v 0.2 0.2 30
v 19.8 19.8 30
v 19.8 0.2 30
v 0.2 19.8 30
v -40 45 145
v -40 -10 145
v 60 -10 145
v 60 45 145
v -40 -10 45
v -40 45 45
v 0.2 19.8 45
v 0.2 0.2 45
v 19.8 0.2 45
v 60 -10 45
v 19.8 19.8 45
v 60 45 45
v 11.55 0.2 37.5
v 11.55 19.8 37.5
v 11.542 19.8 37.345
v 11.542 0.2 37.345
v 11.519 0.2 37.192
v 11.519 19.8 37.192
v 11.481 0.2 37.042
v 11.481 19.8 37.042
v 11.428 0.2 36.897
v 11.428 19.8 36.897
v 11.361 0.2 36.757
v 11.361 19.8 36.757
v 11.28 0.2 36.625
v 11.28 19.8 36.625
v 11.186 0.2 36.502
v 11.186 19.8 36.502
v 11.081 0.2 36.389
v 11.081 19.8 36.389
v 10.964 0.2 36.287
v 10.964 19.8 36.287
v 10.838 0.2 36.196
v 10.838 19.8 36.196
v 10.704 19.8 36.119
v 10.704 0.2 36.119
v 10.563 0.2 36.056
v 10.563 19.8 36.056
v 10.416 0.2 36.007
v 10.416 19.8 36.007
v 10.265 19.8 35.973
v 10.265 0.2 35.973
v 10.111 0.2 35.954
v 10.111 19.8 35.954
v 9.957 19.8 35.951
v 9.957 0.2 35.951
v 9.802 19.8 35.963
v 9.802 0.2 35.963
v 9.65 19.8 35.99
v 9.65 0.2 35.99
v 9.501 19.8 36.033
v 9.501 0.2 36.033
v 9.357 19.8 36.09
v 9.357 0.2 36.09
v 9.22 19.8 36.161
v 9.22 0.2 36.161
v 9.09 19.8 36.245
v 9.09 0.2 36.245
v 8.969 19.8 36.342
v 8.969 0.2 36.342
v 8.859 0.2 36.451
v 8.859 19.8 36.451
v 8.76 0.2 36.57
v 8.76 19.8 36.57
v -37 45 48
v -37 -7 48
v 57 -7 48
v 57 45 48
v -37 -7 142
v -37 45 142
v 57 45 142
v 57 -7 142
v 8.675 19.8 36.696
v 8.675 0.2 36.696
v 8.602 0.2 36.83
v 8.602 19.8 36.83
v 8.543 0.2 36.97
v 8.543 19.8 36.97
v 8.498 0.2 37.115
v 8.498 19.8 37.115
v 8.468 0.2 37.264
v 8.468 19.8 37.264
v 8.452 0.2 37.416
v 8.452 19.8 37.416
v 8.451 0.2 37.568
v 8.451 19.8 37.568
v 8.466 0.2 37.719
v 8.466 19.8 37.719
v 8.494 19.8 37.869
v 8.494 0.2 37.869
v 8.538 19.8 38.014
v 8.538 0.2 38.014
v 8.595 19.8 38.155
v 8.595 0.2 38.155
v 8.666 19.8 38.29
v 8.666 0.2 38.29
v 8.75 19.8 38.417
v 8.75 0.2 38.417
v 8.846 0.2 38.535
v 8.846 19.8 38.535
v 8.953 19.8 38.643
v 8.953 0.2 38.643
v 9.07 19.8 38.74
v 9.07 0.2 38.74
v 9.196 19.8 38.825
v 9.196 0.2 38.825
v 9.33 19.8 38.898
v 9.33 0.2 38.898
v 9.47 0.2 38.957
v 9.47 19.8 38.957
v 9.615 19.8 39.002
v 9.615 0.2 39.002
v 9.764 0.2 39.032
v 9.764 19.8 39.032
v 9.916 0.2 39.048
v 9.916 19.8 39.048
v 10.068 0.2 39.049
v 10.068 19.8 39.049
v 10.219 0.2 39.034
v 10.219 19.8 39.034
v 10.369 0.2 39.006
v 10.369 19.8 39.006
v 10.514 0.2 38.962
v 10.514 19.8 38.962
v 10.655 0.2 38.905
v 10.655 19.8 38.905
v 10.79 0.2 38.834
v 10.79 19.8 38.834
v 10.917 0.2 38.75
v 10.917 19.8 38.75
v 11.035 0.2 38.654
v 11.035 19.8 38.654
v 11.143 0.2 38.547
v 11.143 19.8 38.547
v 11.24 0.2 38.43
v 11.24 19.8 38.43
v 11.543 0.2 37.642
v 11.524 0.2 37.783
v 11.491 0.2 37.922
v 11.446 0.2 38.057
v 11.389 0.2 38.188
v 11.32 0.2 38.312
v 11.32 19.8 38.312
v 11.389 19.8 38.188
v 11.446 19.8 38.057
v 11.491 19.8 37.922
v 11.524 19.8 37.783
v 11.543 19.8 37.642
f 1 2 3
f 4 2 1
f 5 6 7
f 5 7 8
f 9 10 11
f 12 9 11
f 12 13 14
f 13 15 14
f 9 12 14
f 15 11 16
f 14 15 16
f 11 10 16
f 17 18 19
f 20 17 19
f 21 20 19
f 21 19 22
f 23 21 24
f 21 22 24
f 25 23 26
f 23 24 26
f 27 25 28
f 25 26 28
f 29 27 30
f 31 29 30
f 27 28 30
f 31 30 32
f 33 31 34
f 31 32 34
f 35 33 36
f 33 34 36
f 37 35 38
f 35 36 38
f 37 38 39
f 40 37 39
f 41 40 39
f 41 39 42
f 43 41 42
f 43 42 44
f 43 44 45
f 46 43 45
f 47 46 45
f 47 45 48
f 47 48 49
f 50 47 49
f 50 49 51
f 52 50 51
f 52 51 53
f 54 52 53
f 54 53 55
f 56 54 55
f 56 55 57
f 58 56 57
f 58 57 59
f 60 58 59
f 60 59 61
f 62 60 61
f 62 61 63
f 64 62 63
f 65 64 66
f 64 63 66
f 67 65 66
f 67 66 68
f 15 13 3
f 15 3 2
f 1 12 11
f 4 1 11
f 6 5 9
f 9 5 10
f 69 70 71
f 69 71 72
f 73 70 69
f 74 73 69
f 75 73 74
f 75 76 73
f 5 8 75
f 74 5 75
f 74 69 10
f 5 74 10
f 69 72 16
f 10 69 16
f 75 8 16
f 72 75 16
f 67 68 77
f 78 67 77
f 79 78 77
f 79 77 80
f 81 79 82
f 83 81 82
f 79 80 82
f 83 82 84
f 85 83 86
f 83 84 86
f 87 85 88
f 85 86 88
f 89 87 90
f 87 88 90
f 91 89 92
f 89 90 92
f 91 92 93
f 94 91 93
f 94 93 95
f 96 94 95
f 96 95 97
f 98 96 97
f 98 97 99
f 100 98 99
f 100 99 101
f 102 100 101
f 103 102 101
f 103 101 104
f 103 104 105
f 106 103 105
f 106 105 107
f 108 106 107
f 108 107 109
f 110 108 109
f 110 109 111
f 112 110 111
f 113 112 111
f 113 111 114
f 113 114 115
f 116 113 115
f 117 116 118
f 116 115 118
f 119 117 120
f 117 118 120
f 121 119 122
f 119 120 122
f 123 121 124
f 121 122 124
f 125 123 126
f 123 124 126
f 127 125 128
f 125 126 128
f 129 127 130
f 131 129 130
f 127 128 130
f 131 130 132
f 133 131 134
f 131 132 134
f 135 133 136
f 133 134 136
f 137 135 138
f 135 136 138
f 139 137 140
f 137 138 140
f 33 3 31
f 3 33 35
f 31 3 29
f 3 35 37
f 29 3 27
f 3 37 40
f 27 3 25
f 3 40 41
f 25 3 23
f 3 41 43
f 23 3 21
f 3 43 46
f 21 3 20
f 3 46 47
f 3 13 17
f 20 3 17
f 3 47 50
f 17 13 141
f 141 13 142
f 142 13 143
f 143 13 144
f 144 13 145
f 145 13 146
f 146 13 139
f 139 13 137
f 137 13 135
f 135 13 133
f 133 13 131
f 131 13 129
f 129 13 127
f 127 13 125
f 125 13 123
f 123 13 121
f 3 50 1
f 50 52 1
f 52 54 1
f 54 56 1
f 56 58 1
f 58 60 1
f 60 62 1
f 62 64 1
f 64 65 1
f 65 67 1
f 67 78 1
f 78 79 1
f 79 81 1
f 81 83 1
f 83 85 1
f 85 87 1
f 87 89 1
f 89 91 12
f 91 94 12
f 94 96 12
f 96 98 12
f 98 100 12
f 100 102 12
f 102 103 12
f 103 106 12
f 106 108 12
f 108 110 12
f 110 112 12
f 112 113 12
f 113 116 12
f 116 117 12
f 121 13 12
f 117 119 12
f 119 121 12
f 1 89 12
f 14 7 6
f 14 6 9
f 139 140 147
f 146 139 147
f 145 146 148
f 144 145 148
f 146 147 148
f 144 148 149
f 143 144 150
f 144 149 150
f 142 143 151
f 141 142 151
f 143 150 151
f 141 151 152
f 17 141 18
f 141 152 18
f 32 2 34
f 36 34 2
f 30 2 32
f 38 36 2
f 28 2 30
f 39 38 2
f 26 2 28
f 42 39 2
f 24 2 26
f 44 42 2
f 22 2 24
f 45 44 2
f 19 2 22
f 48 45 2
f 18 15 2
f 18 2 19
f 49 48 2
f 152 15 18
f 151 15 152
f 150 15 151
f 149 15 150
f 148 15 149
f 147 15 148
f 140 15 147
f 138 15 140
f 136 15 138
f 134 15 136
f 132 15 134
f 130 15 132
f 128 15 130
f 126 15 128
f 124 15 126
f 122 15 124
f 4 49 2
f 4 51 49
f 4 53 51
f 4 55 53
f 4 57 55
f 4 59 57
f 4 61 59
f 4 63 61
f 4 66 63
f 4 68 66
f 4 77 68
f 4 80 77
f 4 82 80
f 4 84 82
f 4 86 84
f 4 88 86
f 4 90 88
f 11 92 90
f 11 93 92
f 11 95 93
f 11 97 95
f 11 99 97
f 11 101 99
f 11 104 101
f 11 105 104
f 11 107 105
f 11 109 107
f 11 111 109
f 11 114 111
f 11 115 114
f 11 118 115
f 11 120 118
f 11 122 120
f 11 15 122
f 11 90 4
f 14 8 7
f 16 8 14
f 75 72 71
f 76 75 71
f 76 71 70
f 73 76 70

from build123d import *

# Parameters (mm, degrees)
SKETCH_1_W           = 20
SKETCH_1_H           = 20
EXTRUDE_1_DEPTH      = 120
SKETCH_2_W           = 10
SKETCH_2_H           = 20
CUT_EXTRUDE_1_DEPTH  = 120
CUT_EXTRUDE_2_DEPTH  = 120
SKETCH_4_R           = 3
CUT_EXTRUDE_3_DEPTH  = 2
SKETCH_8_W           = 19.6
SKETCH_8_H           = 0.2
SKETCH_8_W_2         = 0.2
SKETCH_8_H_2         = 19.6
CUT_EXTRUDE_6_DEPTH  = 15
SKETCH_9_W           = 10
SKETCH_9_H           = 20
CUT_EXTRUDE_7_DEPTH  = 20
SKETCH_10_W          = 19.6
SKETCH_10_H          = 19.6
EXTRUDE_2_DEPTH      = 15
CUT_EXTRUDE_8_DEPTH  = 20
CUT_EXTRUDE_9_DEPTH  = 20
SKETCH_13_W          = 55
SKETCH_13_H          = 20
SKETCH_13_W_2        = 18.82824967
CUT_EXTRUDE_10_DEPTH = 20
SKETCH_14_W          = 100
SKETCH_14_H          = 55
EXTRUDE_5_DEPTH      = 5
SKETCH_17_W          = 2
SKETCH_17_H          = 55
CUT_EXTRUDE_12_DEPTH = 1000
EXTRUDE_6_DEPTH      = 94
SKETCH_19_W          = 3
SKETCH_19_H          = 55
EXTRUDE_7_DEPTH      = 100


with BuildPart() as part:
    # 草图1 → 凸台-拉伸1 (new body)
    with BuildSketch(Plane.XY):
        with Locations((10, 10)):
            Rectangle(SKETCH_1_W, SKETCH_1_H)
    extrude(amount=EXTRUDE_1_DEPTH)

    # 草图2 → 切除-拉伸1 (cut)
    with BuildSketch(Plane(origin=(0, 20, 0), x_dir=(1, 0, 0), z_dir=(0, 1, 0))):
        with Locations((15, -10)):
            Rectangle(SKETCH_2_W, SKETCH_2_H)
    extrude(amount=-CUT_EXTRUDE_1_DEPTH, mode=Mode.SUBTRACT)

    # 草图3 → 切除-拉伸2 (cut)
    with BuildSketch(Plane(origin=(10, 0, 0), x_dir=(0, 0, -1), z_dir=(1, 0, 0))):
        with BuildLine():
            ThreePointArc((-8.45, 10), (-9.40684068, 11.432013275), (-11.096015511, 11.096015511))
            Line((-11.096015511, 11.096015511), (-8.903984489, 8.903984489))
            ThreePointArc((-8.903984489, 8.903984489), (-8.567986725, 9.40684068), (-8.45, 10))
        make_face()
        with BuildLine():
            Line((-8.903984489, 8.903984489), (-11.096015511, 11.096015511))
            ThreePointArc((-11.096015511, 11.096015511), (-11.096015511, 8.903984489), (-8.903984489, 8.903984489))
        make_face()
    extrude(amount=-CUT_EXTRUDE_2_DEPTH, mode=Mode.SUBTRACT)

    # 草图4 → 切除-拉伸3 (cut)
    with BuildSketch(Plane.ZY):
        with Locations((10, 10)):
            Circle(SKETCH_4_R)
    extrude(amount=-CUT_EXTRUDE_3_DEPTH, mode=Mode.SUBTRACT)

    # 草图8 → 切除-拉伸6 (cut)
    with BuildSketch(Plane.XY.offset(120)):
        with Locations((10, 19.9)):
            Rectangle(SKETCH_8_W, SKETCH_8_H)
        with Locations((0.1, 19.9)):
            Rectangle(SKETCH_8_W_2, SKETCH_8_H)
        with Locations((0.1, 10)):
            Rectangle(SKETCH_8_W_2, SKETCH_8_H_2)
        with Locations((19.9, 10)):
            Rectangle(SKETCH_8_W_2, SKETCH_8_H_2)
        with Locations((19.9, 0.1)):
            Rectangle(SKETCH_8_W_2, SKETCH_8_H)
        with Locations((10, 0.1)):
            Rectangle(SKETCH_8_W, SKETCH_8_H)
        with Locations((0.1, 0.1)):
            Rectangle(SKETCH_8_W_2, SKETCH_8_H)
        with Locations((19.9, 19.9)):
            Rectangle(SKETCH_8_W_2, SKETCH_8_H)
    extrude(amount=-CUT_EXTRUDE_6_DEPTH, mode=Mode.SUBTRACT)

    # 草图9 → 切除-拉伸7 (cut)
    with BuildSketch(Plane(origin=(0, 20, 0), x_dir=(1, 0, 0), z_dir=(0, 1, 0))):
        Polygon((0, 0), (0, -45), (20, -45), (20, -20), (10, -20), (10, 0), align=None)
        with Locations((15, -10)):
            Rectangle(SKETCH_9_W, SKETCH_9_H)
    extrude(amount=-CUT_EXTRUDE_7_DEPTH, mode=Mode.SUBTRACT)

    # 草图10 → 凸台-拉伸2 (add)
    with BuildSketch(Plane(origin=(0, 0, 45), x_dir=(-1, 0, 0), z_dir=(0, 0, -1))):
        with Locations((-10, 10)):
            Rectangle(SKETCH_10_W, SKETCH_10_H)
    extrude(amount=EXTRUDE_2_DEPTH)

    # 草图11 → 切除-拉伸8 (cut)
    with BuildSketch(Plane(origin=(0, 19.8, 0), x_dir=(1, 0, 0), z_dir=(0, 1, 0))):
        with BuildLine():
            ThreePointArc((11.547573501, -112.5), (10.487812185, -111.029569439), (8.757681845, -111.569855559))
            Line((8.757681845, -111.569855559), (11.237465157, -113.430144441))
            ThreePointArc((11.237465157, -113.430144441), (11.468004062, -112.990238683), (11.547573501, -112.5))
        make_face()
        with BuildLine():
            Line((11.237465157, -113.430144441), (8.757681845, -111.569855559))
            ThreePointArc((8.757681845, -111.569855559), (9.06742906, -113.739891656), (11.237465157, -113.430144441))
        make_face()
    extrude(amount=-CUT_EXTRUDE_8_DEPTH, mode=Mode.SUBTRACT)

    # 草图12 → 切除-拉伸9 (cut)
    with BuildSketch(Plane(origin=(0, 19.8, 0), x_dir=(1, 0, 0), z_dir=(0, 1, 0))):
        with BuildLine():
            ThreePointArc((11.55, -37.5), (10.490153037, -36.029540888), (8.76, -36.57))
            Line((8.76, -36.57), (11.24, -38.43))
            ThreePointArc((11.24, -38.43), (11.470459112, -37.990153037), (11.55, -37.5))
        make_face()
        with BuildLine():
            Line((11.24, -38.43), (8.76, -36.57))
            ThreePointArc((8.76, -36.57), (9.07, -38.74), (11.24, -38.43))
        make_face()
    extrude(amount=-CUT_EXTRUDE_9_DEPTH, mode=Mode.SUBTRACT)

    # 草图13 → 切除-拉伸10 (cut)
    with BuildSketch(Plane.ZY):
        with Locations((77.5, 10)):
            Rectangle(SKETCH_13_W, SKETCH_13_H)
        with Locations((114.414124835, 10)):
            Rectangle(SKETCH_13_W_2, SKETCH_13_H)
    extrude(amount=-CUT_EXTRUDE_10_DEPTH, mode=Mode.SUBTRACT)

    # 草图14 → 凸台-拉伸5 (add)
    with BuildSketch(Plane.XY.offset(50)):
        with Locations((10, 17.5)):
            Rectangle(SKETCH_14_W, SKETCH_14_H)
    extrude(amount=-EXTRUDE_5_DEPTH)

    # 草图17 → 切除-拉伸12 (cut)
    with BuildSketch(Plane.ZY.offset(40)):
        with Locations((49, 17.5)):
            Rectangle(SKETCH_17_W, SKETCH_17_H)
    extrude(amount=-CUT_EXTRUDE_12_DEPTH, mode=Mode.SUBTRACT)

    # 草图18 → 凸台-拉伸6 (add)
    with BuildSketch(Plane.XY.offset(48)):
        Polygon((-40, -10), (60, -10), (60, 45), (57, 45), (57, -7), (-37, -7), (-37, 45), (-40, 45), align=None)
    extrude(amount=EXTRUDE_6_DEPTH)

    # 草图19 → 凸台-拉伸7 (add)
    with BuildSketch(Plane(origin=(60, 0, 0), x_dir=(0, 0, -1), z_dir=(1, 0, 0))):
        with Locations((-143.5, 17.5)):
            Rectangle(SKETCH_19_W, SKETCH_19_H)
    extrude(amount=-EXTRUDE_7_DEPTH)


solid = part.part
